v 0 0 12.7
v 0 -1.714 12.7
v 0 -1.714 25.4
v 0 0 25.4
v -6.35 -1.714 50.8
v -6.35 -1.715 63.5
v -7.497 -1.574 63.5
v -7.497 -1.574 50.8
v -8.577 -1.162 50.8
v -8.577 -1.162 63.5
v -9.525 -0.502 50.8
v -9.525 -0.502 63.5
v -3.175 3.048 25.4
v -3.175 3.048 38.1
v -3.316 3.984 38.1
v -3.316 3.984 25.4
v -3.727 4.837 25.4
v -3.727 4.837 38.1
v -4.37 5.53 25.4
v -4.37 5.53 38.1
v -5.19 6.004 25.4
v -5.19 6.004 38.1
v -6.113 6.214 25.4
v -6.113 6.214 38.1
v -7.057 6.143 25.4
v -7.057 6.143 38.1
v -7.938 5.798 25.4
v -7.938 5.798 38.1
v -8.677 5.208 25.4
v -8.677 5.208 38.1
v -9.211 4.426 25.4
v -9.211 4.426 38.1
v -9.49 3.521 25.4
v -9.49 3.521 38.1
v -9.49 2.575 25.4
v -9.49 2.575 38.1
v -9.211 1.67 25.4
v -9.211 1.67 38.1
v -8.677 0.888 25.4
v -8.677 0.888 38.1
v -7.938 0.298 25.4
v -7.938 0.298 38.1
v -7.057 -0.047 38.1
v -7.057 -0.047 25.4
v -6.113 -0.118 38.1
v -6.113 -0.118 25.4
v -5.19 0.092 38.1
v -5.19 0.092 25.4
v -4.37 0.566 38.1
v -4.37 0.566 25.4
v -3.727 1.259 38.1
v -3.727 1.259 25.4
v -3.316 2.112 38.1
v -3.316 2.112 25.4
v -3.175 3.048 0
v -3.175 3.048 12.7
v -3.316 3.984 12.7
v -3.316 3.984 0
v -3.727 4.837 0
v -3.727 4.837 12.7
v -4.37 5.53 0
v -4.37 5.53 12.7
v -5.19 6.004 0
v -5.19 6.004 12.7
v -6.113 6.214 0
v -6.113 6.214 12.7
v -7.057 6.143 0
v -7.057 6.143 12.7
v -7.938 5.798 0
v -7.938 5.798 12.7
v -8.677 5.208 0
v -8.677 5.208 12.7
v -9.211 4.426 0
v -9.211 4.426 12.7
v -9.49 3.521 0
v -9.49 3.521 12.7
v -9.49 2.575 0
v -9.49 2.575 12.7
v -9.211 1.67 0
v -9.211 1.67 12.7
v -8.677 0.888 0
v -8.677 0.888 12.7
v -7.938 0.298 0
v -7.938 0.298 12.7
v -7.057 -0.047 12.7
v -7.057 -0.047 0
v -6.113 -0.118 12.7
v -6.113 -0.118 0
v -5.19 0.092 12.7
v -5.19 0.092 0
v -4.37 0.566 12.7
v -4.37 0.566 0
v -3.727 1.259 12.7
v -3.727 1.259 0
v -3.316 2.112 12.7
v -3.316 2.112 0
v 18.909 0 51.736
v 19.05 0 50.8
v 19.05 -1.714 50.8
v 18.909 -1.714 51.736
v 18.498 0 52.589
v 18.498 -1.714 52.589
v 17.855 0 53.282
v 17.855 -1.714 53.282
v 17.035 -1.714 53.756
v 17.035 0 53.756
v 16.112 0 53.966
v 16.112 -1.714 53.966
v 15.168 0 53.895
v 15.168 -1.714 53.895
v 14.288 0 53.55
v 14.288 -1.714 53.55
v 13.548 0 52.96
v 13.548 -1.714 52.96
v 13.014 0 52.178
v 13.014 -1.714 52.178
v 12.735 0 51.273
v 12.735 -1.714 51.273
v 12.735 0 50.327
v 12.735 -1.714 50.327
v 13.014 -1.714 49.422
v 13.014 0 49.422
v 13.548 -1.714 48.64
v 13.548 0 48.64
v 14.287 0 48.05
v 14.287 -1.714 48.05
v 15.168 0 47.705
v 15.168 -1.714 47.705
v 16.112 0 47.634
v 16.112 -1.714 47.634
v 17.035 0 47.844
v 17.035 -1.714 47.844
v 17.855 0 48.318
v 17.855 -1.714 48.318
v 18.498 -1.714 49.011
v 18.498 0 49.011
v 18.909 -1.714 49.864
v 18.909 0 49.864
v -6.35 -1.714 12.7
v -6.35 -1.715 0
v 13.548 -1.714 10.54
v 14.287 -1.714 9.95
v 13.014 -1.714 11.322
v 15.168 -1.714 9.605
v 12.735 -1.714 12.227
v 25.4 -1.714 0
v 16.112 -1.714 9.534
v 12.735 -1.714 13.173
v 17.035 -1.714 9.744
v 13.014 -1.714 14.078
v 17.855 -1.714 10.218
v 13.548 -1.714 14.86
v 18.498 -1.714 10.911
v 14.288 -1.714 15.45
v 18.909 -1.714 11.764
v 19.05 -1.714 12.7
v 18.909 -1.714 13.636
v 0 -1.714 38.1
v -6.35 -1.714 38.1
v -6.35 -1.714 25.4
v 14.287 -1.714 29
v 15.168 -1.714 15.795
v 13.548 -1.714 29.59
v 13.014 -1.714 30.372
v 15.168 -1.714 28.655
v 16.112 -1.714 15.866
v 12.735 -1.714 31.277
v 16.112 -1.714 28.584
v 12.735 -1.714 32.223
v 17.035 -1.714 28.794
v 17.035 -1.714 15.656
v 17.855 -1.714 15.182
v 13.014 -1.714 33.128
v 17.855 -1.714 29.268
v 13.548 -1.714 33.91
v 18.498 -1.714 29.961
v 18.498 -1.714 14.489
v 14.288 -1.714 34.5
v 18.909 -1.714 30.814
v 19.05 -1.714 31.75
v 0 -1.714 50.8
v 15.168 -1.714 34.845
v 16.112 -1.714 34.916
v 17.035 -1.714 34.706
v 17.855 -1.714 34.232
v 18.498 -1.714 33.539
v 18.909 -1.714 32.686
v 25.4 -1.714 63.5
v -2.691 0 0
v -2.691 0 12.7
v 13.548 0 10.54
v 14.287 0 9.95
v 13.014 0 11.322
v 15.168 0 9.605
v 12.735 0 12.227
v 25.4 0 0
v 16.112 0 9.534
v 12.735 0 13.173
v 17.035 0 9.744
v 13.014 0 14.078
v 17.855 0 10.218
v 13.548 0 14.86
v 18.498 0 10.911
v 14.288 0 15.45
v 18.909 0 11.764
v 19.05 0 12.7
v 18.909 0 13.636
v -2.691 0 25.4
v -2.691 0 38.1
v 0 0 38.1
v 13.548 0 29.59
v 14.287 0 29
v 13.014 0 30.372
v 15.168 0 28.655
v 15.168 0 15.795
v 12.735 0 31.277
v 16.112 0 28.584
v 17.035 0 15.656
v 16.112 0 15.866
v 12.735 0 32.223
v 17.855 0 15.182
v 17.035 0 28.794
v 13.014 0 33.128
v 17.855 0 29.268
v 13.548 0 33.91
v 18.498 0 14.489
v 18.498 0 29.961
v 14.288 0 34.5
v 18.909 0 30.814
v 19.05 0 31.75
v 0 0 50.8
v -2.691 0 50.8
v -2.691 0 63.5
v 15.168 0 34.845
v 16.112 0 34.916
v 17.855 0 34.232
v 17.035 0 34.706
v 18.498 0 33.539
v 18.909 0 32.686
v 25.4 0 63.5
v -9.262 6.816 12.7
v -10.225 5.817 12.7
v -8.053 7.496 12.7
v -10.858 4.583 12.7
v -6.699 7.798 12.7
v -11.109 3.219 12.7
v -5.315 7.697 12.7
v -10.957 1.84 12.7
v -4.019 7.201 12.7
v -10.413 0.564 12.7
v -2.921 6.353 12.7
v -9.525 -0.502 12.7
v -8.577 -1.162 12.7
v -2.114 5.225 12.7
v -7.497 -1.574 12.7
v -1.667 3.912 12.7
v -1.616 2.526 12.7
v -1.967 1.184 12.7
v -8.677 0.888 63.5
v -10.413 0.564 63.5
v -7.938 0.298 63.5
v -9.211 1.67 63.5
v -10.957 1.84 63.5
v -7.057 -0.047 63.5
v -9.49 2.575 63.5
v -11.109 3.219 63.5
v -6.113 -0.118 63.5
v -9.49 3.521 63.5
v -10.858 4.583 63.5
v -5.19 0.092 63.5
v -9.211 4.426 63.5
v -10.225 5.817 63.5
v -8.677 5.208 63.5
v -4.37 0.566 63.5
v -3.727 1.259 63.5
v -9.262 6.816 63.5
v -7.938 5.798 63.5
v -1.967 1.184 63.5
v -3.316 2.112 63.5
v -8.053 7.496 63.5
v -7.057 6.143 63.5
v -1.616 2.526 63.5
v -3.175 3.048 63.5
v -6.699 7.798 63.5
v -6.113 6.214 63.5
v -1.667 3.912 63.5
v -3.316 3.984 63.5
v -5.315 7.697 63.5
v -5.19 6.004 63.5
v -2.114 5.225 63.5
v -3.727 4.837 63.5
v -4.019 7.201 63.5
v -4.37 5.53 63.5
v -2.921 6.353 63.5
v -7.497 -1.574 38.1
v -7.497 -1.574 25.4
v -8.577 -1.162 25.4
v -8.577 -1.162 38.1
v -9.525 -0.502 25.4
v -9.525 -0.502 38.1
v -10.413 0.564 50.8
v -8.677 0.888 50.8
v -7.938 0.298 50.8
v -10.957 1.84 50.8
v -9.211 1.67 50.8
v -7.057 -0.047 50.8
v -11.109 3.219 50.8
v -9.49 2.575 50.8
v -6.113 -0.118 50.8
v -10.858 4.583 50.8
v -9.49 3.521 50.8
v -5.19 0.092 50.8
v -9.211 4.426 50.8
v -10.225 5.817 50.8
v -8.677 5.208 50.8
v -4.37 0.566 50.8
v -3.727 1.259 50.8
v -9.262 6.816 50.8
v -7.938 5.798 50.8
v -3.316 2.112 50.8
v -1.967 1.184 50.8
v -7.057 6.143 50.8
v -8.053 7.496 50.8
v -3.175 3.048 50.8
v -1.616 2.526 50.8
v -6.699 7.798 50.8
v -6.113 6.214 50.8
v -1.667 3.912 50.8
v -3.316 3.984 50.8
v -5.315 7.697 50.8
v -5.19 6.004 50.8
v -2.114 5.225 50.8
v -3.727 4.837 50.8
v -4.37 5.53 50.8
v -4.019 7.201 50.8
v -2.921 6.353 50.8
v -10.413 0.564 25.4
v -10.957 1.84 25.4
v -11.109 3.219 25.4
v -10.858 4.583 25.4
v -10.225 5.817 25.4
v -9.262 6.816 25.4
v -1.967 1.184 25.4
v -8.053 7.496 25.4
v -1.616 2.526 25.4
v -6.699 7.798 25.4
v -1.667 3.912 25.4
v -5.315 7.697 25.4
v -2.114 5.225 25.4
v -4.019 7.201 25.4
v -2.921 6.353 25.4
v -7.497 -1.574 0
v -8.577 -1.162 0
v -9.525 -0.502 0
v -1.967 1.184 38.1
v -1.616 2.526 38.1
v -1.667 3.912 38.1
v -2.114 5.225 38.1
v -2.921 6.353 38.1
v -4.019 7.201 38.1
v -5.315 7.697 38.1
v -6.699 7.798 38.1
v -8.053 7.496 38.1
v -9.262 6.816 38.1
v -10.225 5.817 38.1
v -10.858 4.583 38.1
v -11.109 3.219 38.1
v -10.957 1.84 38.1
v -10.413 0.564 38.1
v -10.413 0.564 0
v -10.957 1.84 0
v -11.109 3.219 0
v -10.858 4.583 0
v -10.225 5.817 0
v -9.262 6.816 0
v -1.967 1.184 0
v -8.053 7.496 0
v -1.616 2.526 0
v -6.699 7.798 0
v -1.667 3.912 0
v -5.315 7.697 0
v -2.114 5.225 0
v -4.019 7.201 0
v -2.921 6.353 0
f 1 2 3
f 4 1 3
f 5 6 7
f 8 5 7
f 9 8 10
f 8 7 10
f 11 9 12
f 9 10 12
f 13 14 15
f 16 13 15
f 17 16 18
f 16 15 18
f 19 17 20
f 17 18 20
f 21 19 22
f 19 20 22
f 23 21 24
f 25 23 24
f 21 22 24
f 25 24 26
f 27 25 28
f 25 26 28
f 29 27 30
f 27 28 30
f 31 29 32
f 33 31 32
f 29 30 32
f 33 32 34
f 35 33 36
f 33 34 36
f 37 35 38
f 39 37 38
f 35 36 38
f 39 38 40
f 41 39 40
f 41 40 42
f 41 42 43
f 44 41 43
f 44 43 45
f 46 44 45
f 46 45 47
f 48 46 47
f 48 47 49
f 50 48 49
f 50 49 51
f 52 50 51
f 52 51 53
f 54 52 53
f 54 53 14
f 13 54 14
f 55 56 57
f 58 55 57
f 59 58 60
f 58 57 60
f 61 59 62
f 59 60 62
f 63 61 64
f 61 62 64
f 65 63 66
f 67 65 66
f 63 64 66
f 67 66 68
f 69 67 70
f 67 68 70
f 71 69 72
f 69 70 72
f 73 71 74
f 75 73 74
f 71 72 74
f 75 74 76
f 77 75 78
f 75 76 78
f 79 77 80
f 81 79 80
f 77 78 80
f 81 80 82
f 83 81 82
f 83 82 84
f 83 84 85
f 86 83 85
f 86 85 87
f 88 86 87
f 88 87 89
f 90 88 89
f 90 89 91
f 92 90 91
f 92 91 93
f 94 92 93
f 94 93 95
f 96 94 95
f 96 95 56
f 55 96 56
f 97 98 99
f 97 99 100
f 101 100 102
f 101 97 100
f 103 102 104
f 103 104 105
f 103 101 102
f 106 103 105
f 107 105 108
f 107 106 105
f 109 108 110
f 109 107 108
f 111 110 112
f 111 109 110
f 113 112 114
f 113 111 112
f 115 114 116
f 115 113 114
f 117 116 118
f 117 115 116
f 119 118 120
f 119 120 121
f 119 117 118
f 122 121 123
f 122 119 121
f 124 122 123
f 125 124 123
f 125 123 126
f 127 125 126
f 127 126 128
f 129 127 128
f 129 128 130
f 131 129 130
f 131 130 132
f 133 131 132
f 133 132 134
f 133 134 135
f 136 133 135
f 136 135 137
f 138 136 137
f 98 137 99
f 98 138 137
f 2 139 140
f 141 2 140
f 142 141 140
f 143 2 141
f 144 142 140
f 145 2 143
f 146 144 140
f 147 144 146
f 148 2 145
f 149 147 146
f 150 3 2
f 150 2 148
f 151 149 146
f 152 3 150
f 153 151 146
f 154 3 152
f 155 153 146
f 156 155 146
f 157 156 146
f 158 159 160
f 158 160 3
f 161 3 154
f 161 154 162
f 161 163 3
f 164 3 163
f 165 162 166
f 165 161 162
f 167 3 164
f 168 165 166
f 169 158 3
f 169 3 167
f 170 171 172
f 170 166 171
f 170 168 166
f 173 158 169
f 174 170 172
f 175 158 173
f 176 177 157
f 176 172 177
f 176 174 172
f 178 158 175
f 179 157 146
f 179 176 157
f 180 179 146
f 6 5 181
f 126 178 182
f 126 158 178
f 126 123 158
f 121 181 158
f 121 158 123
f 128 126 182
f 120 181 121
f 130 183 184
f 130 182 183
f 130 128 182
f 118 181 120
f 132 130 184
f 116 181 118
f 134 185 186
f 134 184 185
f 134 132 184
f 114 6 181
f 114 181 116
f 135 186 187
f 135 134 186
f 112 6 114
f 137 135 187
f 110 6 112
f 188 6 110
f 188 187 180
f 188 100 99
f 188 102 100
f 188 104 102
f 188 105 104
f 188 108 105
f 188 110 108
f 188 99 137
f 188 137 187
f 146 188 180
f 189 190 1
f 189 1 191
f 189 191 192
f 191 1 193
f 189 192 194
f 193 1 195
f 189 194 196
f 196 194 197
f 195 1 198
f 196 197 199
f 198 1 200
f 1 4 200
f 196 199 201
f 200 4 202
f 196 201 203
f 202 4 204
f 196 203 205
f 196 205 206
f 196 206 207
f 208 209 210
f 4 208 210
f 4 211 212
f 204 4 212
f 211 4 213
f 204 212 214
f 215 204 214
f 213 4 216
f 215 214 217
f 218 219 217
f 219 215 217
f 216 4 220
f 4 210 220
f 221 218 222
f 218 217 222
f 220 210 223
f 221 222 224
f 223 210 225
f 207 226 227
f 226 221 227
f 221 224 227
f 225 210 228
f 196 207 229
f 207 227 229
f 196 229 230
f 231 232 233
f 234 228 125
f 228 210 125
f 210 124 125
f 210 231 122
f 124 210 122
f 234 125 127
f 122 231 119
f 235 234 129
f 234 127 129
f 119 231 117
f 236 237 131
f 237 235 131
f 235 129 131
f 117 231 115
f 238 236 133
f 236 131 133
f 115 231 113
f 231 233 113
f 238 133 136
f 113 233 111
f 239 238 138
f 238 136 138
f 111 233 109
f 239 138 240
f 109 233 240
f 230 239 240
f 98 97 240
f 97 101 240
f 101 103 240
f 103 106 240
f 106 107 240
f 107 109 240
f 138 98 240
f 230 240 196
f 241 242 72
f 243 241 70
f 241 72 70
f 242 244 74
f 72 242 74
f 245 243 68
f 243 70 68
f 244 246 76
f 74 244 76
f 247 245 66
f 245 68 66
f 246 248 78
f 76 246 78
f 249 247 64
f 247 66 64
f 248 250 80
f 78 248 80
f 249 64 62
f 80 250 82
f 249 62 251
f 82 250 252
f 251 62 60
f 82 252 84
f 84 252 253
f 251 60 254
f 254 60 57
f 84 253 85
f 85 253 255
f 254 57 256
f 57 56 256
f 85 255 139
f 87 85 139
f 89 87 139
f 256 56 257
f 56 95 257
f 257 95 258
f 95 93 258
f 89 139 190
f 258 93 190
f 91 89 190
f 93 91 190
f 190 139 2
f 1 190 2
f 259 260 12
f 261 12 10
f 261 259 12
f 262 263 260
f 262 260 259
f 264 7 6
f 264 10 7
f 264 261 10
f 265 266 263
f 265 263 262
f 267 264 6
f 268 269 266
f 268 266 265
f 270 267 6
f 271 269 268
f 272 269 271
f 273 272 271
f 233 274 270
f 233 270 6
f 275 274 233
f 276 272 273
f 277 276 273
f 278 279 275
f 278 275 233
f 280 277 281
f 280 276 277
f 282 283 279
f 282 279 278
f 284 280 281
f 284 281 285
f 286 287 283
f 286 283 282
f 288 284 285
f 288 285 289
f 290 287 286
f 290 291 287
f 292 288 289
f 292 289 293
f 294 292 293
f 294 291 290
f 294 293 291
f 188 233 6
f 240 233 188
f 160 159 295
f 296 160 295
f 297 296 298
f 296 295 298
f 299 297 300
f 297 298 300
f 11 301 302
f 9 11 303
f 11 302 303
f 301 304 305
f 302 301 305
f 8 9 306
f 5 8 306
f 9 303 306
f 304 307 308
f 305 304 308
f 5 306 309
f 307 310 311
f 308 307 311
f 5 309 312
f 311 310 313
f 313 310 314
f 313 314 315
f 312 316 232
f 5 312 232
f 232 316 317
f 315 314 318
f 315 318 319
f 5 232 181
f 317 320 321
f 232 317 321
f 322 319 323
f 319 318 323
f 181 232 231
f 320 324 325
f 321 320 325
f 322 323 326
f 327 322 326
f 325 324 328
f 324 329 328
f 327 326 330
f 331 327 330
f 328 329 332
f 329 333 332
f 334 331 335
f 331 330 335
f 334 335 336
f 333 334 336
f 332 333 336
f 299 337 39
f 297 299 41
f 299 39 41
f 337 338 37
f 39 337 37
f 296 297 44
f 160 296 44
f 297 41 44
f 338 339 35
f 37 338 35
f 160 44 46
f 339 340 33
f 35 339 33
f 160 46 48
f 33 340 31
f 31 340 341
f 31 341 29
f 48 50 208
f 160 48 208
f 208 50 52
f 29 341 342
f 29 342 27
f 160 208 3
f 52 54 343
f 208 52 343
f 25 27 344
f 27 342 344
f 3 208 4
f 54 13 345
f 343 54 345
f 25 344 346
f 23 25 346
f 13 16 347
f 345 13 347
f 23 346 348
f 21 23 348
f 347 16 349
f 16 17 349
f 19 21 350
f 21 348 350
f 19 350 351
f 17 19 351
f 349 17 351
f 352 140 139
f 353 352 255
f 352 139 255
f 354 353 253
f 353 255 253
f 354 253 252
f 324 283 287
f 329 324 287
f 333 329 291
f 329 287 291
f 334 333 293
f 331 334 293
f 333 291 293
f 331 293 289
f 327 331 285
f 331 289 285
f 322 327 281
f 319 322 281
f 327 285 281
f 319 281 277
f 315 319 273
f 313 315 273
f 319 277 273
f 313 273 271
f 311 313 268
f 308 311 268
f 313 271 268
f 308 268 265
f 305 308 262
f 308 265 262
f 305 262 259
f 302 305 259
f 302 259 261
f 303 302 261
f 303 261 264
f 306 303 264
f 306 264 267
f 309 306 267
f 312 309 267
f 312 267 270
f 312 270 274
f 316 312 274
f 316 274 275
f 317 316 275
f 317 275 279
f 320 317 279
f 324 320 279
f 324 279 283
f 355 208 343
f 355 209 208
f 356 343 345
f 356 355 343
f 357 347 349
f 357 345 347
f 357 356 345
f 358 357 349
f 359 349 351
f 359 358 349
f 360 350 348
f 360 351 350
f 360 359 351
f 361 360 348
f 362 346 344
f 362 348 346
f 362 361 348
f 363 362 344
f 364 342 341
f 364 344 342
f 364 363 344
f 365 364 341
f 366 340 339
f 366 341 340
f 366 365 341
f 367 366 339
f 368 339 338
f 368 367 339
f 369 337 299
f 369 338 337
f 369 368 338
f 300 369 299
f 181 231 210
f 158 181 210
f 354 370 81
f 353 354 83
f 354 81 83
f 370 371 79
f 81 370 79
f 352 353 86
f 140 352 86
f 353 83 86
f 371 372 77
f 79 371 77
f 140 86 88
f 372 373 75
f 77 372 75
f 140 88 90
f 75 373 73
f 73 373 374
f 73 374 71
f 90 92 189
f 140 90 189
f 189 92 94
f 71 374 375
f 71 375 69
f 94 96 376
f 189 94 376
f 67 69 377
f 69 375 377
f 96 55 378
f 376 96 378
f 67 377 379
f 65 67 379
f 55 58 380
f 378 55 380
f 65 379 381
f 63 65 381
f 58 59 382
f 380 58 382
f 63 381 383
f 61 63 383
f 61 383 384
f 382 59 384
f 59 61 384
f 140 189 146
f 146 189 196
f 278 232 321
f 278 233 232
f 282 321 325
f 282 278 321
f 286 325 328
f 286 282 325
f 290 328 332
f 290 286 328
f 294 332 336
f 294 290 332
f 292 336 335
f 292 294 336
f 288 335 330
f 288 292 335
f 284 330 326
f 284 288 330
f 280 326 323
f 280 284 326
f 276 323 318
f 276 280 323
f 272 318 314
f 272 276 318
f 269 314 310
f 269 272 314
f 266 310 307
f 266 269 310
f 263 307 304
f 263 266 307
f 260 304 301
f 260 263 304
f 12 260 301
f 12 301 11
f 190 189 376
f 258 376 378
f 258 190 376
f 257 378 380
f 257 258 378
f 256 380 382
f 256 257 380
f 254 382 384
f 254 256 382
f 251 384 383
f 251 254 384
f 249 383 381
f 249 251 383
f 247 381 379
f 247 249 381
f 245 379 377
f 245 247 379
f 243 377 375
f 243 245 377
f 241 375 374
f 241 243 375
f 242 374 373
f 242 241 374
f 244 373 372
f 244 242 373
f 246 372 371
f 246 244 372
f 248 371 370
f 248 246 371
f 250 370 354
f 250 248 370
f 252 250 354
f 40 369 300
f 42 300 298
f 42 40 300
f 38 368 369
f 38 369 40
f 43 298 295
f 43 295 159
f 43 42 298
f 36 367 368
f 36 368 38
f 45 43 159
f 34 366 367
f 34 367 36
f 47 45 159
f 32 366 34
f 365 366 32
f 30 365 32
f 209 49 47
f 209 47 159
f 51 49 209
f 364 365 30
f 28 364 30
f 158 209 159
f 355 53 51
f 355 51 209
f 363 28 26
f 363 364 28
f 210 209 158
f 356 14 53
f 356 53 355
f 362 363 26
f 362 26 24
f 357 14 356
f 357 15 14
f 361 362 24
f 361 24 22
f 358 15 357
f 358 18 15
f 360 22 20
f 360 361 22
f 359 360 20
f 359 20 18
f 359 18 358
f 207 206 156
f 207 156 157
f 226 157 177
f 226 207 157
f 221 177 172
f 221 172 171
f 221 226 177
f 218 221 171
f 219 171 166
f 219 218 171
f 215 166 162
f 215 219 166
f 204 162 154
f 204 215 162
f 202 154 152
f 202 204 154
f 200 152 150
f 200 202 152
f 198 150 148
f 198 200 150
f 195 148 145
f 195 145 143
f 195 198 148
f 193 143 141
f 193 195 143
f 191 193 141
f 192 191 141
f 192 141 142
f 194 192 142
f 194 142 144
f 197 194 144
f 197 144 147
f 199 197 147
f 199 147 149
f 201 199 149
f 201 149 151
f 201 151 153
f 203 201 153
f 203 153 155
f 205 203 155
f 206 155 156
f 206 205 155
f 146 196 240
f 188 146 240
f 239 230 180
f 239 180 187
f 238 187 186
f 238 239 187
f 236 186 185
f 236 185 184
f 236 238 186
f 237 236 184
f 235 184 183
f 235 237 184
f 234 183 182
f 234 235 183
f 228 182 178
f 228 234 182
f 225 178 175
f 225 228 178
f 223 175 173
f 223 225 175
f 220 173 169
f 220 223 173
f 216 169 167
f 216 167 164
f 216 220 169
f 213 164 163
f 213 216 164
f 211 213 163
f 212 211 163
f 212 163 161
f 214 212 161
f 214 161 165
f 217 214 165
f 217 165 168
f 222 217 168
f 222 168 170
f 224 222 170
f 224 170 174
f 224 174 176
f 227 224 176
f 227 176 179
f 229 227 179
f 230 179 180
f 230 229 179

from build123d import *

# Parameters (mm, degrees)
F0_R     = 3.175
F0_W     = 9.525
F0_H     = 12.7
F1_DEPTH = 1.7145
F2_R     = 4.7625
F3_DEPTH = 63.5
F4_R     = 3.175
F5_DEPTH = 63.501
F6_W     = 12.38743
F6_H     = 12.7
F6_W_2   = 12.611339
F7_DEPTH = 25.4


with BuildPart() as f1:
    # F0 (on Front) → F1 (new body)
    with BuildSketch(Plane.XZ):
        Polygon((0, 12.7), (0, 0), (25.4, 0), (25.4, 63.5), (0, 63.5), (0, 50.8), (0, 38.1), (0, 25.4), align=None)
        with Locations((15.875, 12.7)):
            Circle(F0_R, mode=Mode.SUBTRACT)
        with Locations((15.875, 31.75)):
            Circle(F0_R, mode=Mode.SUBTRACT)
        with Locations((15.875, 50.8)):
            Circle(F0_R, mode=Mode.SUBTRACT)
        with Locations((-4.7625, 6.35)):
            Rectangle(F0_W, F0_H)
        with Locations((-4.7625, 31.75)):
            Rectangle(F0_W, F0_H)
        with Locations((-4.7625, 57.15)):
            Rectangle(F0_W, F0_H)
    extrude(amount=F1_DEPTH)

    # F2 (on face) → F3 (join)
    with BuildSketch(Plane.XY.offset(63.5)):
        with Locations((-6.35, 3.048)):
            Circle(F2_R)
    extrude(amount=-F3_DEPTH)

    # F4 (on face) → F5 (cut, through all)
    with BuildSketch(Plane.XY.offset(63.5)):
        with BuildLine():
            ThreePointArc((-6.35, -1.7145), (-8.049365, -1.400996), (-9.525, -0.501758))
            Line((-9.525, -0.501758), (-9.525, -1.7145))
            Line((-9.525, -1.7145), (-6.35, -1.7145))
        make_face()
        with Locations((-6.35, 3.048)):
            Circle(F4_R)
    extrude(amount=-F5_DEPTH, mode=Mode.SUBTRACT)

    # F6 (on face) → F7 (cut)
    with BuildSketch(Plane.XZ.offset(1.7145)):
        with Locations((-6.193715, 44.45)):
            Rectangle(F6_W, F6_H)
        with Locations((-6.305669, 19.05)):
            Rectangle(F6_W_2, F6_H)
    extrude(amount=-F7_DEPTH, mode=Mode.SUBTRACT)


solid = f1.part
